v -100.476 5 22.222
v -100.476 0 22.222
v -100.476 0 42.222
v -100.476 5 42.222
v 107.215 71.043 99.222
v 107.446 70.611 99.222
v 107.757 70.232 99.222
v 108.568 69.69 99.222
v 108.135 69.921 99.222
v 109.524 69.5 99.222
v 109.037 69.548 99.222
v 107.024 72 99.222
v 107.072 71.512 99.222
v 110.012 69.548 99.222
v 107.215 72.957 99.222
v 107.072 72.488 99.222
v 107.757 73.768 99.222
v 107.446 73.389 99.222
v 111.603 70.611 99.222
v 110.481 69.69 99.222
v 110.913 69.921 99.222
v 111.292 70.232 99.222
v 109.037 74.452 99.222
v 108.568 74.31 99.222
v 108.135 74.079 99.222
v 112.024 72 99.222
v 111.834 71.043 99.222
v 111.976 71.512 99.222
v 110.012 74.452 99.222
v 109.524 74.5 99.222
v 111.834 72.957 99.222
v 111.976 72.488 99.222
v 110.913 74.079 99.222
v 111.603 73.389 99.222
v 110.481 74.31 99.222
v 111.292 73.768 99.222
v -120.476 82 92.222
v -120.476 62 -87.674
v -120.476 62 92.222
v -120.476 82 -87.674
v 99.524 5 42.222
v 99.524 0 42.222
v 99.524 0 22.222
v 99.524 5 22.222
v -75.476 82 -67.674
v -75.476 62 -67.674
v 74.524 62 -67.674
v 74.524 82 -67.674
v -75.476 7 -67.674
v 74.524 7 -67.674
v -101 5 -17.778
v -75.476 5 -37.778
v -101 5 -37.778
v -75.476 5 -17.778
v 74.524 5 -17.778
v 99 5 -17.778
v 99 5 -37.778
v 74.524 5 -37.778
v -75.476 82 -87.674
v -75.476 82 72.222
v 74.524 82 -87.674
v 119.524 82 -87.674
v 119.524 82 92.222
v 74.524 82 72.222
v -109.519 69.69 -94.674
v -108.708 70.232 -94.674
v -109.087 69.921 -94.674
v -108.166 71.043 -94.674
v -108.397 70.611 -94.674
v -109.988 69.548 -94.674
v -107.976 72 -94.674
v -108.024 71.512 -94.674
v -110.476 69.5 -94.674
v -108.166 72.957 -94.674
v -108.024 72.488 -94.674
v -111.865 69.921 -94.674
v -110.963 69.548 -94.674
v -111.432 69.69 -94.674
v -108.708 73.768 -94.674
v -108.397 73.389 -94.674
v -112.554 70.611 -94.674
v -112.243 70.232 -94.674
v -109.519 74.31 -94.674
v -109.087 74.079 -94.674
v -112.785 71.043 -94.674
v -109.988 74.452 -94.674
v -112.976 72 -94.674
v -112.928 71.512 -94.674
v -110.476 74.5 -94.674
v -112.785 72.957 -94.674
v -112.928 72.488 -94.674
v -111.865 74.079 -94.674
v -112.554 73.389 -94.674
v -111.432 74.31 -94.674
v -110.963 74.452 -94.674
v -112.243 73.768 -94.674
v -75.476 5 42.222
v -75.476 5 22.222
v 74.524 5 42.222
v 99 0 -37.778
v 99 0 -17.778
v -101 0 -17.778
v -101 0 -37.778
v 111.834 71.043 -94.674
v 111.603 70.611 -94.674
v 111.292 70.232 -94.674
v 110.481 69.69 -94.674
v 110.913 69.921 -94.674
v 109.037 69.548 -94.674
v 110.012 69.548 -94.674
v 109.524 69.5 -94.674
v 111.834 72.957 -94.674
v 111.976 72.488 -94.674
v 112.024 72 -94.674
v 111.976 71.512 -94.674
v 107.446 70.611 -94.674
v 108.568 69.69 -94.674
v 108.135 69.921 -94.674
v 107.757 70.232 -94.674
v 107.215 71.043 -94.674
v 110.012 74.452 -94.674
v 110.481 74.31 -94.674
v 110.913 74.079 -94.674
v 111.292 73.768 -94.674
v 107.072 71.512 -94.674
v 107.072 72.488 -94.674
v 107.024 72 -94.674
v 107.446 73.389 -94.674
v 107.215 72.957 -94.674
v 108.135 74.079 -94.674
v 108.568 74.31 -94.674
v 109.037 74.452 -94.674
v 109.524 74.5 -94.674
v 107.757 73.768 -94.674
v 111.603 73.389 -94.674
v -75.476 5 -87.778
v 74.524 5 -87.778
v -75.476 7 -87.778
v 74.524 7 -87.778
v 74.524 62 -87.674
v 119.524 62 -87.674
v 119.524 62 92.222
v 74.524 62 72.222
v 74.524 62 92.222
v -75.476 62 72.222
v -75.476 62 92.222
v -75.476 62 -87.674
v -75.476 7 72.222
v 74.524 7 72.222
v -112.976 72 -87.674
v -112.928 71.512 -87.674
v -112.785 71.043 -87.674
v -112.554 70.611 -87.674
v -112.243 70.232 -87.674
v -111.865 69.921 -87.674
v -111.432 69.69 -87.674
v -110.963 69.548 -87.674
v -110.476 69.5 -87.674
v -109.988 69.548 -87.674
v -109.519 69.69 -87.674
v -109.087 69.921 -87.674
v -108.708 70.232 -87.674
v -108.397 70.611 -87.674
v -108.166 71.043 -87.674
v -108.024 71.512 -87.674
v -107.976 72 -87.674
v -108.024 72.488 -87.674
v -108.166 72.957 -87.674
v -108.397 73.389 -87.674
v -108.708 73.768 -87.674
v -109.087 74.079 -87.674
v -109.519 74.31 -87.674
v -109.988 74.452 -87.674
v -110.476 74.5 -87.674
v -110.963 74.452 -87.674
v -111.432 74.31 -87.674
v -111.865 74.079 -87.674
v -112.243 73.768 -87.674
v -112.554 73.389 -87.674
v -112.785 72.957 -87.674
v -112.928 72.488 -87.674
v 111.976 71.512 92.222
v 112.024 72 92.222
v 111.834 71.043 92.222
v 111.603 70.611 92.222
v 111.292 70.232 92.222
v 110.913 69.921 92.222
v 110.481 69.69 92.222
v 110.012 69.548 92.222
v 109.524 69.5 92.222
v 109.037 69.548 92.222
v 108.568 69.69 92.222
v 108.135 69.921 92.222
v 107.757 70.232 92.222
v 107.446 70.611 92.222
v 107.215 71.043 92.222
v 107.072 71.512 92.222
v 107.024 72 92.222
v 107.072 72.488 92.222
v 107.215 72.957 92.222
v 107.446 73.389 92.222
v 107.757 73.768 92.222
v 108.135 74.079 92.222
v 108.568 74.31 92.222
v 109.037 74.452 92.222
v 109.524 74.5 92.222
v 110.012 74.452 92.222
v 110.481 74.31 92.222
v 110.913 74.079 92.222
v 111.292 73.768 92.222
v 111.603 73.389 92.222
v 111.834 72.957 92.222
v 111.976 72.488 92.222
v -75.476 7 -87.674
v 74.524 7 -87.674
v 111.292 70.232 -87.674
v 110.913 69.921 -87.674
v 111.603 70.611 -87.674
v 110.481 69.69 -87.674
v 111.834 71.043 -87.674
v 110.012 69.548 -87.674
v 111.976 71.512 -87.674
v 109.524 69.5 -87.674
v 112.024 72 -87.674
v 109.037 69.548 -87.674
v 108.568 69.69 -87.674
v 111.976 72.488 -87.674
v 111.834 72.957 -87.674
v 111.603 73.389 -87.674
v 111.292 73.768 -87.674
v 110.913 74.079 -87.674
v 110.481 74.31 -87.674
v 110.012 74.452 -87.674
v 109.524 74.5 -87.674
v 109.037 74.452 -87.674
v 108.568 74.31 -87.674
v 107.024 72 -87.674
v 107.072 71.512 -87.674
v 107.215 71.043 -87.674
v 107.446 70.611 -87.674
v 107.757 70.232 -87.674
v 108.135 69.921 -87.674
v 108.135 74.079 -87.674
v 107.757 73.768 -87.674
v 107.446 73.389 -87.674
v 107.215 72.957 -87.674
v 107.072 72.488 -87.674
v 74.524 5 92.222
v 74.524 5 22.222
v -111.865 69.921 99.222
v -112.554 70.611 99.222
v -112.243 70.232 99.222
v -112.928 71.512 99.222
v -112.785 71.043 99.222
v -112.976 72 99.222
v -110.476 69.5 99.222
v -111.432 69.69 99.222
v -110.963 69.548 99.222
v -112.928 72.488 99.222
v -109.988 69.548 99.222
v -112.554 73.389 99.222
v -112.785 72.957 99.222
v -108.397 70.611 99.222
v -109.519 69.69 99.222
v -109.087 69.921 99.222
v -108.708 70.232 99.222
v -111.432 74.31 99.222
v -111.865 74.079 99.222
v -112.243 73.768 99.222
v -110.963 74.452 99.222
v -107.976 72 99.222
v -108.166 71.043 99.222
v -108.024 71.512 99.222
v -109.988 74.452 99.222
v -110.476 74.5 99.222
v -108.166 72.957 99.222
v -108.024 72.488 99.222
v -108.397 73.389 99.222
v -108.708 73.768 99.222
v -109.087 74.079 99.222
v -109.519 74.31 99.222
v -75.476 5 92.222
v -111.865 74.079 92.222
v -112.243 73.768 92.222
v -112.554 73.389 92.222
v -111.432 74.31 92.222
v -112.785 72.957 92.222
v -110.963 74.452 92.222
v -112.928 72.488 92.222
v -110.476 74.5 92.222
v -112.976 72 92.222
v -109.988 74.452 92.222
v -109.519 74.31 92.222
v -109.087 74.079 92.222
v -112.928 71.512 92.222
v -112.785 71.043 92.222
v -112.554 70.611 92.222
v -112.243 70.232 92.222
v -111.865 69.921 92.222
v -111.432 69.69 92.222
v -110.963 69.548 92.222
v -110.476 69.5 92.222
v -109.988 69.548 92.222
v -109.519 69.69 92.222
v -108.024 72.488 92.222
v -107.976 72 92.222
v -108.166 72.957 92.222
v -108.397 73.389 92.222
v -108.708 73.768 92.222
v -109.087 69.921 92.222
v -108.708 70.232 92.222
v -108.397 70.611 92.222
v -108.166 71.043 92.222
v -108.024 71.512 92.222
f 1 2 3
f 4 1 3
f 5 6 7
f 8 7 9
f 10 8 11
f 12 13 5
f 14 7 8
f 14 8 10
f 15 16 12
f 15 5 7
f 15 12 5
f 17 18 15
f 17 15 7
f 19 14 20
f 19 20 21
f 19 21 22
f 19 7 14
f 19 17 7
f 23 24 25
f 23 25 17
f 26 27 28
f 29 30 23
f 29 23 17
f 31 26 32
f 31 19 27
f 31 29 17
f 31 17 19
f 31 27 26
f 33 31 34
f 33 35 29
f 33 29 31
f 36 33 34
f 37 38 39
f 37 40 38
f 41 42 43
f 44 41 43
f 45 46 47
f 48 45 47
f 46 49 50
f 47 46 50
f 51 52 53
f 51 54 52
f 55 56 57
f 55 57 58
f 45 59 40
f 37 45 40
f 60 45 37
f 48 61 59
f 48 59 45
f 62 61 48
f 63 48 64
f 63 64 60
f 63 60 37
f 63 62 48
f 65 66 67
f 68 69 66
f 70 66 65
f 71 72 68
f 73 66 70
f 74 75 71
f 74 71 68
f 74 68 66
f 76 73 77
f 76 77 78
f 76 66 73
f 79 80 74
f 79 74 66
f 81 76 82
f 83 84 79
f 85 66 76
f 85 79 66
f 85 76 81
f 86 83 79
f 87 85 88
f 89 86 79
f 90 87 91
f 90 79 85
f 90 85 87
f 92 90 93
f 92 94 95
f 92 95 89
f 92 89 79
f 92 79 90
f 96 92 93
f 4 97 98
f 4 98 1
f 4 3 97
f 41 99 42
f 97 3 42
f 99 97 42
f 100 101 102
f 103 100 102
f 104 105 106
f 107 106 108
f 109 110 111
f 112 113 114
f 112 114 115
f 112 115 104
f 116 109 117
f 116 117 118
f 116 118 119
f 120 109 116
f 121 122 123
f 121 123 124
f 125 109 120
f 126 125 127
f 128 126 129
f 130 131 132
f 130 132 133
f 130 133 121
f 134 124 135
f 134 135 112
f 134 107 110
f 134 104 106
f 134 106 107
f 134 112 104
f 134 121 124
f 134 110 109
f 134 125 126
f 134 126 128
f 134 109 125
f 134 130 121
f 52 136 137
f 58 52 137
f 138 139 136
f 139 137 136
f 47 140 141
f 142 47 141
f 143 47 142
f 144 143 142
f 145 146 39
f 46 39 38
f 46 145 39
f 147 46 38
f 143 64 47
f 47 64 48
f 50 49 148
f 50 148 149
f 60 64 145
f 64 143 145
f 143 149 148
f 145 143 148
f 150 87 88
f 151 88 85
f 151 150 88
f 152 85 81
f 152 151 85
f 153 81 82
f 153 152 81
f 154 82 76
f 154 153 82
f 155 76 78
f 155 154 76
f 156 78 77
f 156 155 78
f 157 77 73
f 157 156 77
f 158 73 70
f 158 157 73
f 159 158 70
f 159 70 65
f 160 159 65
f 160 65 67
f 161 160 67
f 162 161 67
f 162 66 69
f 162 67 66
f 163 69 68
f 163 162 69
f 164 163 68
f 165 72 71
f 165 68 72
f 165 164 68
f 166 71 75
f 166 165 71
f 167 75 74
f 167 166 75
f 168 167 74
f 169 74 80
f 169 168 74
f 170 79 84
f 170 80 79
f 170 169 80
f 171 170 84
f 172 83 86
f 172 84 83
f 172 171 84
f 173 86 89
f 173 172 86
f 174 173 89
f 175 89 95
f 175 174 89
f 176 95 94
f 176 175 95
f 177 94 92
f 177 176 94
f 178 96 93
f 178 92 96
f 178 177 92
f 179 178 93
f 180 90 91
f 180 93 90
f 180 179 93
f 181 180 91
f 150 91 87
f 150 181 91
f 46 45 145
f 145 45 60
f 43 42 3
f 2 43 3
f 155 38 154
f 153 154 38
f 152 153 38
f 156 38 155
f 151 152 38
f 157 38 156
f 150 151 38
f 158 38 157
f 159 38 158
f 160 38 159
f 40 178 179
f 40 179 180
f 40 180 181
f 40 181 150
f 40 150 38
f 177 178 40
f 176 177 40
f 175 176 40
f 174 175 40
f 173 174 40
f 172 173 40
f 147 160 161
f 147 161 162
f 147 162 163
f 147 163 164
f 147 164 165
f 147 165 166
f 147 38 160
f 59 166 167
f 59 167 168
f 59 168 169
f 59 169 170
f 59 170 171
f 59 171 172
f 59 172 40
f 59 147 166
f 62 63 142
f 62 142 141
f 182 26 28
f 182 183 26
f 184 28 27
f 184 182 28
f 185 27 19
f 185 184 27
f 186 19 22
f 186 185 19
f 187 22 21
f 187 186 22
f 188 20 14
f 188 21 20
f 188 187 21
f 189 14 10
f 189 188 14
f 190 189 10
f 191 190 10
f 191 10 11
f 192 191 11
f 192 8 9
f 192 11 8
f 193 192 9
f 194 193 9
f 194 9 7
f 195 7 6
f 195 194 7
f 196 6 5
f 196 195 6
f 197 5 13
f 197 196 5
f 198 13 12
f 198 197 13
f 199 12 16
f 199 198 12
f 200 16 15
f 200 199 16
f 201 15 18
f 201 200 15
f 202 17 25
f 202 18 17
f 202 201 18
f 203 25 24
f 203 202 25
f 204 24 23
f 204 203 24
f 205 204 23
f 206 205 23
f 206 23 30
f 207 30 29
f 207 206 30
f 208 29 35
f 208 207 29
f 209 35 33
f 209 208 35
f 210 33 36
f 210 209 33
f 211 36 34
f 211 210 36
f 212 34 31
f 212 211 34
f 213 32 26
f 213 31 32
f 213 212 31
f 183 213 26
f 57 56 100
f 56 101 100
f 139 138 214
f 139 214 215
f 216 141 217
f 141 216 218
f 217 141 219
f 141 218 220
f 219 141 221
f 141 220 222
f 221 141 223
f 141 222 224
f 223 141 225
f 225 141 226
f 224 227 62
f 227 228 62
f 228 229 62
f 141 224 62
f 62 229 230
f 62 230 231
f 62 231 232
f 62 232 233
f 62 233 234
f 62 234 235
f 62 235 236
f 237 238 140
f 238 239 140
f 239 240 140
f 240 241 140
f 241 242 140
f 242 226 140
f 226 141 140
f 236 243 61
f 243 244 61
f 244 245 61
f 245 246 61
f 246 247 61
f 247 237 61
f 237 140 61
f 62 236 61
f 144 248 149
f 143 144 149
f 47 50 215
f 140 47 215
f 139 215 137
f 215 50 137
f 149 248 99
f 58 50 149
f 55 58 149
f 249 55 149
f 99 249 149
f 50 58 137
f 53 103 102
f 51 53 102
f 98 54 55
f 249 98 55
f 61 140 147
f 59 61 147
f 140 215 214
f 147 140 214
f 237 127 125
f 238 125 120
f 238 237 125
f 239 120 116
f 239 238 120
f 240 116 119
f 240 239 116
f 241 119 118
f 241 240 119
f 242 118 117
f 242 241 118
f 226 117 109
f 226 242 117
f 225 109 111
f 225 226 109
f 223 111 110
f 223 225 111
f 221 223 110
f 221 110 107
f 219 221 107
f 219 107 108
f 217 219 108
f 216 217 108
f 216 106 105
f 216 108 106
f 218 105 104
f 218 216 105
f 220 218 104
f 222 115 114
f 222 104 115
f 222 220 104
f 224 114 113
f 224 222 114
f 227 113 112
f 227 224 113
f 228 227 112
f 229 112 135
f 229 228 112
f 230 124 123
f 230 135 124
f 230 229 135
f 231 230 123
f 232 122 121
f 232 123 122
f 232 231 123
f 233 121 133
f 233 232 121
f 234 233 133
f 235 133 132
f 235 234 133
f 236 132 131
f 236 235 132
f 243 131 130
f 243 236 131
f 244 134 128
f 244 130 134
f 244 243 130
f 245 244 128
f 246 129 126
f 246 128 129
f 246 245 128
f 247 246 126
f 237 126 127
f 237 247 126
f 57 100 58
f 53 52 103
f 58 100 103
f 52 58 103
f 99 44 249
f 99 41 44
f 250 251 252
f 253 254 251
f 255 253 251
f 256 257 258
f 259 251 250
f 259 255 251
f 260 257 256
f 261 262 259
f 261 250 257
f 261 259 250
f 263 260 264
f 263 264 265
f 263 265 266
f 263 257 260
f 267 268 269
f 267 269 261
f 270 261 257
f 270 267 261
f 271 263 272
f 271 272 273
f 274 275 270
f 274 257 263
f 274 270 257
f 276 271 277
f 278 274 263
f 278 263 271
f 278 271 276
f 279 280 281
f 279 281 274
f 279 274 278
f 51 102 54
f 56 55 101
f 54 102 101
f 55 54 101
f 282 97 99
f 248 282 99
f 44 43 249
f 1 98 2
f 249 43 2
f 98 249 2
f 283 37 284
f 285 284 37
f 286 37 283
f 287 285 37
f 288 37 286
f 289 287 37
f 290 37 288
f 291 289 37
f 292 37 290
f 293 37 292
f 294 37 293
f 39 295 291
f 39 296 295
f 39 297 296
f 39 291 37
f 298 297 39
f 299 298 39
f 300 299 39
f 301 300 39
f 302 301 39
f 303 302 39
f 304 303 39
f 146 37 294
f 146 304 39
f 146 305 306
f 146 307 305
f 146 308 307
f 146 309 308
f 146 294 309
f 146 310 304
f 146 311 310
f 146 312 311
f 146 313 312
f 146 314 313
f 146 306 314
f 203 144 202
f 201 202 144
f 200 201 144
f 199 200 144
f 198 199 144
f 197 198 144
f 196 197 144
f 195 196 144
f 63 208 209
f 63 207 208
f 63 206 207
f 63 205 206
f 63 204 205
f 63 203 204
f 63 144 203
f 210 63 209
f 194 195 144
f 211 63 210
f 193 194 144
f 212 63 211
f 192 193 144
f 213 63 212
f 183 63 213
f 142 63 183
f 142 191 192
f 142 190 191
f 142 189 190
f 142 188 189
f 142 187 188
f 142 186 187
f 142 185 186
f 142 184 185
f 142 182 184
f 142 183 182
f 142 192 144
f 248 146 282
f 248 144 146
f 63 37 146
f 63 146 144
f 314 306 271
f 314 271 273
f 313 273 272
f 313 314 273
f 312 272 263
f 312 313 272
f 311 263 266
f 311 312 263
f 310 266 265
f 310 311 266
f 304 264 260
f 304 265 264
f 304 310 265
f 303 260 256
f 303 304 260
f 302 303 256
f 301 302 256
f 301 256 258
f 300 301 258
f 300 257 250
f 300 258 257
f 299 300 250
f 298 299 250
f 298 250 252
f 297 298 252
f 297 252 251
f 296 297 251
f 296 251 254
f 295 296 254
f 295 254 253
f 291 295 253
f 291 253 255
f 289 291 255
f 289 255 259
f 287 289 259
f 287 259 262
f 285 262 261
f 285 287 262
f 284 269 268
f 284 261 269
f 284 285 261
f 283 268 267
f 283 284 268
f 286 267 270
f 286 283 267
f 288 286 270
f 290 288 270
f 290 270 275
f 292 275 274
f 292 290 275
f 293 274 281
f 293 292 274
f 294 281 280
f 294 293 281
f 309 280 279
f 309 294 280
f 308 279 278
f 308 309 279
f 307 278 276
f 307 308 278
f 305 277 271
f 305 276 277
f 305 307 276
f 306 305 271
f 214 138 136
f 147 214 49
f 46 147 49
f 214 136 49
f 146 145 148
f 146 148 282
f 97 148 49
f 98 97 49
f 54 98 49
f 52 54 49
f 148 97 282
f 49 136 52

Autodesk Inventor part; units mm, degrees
ref_plane "YZ Plane" through (0, 0, 0) normal (1, 0, 0) x (0, 1, 0)
ref_plane "XZ Plane" through (0, 0, 0) normal (0, 1, 0) x (-1, 0, 0)
ref_plane "XY Plane" through (0, 0, 0) normal (0, 0, 1) x (1, 0, 0)
sketch "Эскиз1" plane through (0, 0, 0) normal (0, 1, 0) x (-1, 0, 0)
  line L0 (100.4756, 42.2222) -> (-99.5244, 42.2222)
  line L1 (-99.5244, 42.2222) -> (-99.5244, 22.2222)
  line L2 (-99.5244, 22.2222) -> (100.4756, 22.2222)
  line L3 (100.4756, 22.2222) -> (100.4756, 42.2222)
  line L4 (101, -17.7778) -> (-99, -17.7778)
  line L5 (-99, -17.7778) -> (-99, -37.7778)
  line L6 (-99, -37.7778) -> (101, -37.7778)
  line L7 (101, -37.7778) -> (101, -17.7778)
  point P0 (0, 0)
  dimension "d0" = 200
  dimension "d1" = 20
  dimension "d2" = 200
  dimension "d3" = 20
  dimension "d4" = 40
extrude "Выдавливание1" add sketch "Эскиз1" along normal blind 5
sketch "Эскиз2" plane through (0, 5, 0) normal (0, 1, 0) x (1, 0, 0)
  line L0 (-75.4756, -92.2222) -> (74.5244, -92.2222)
  line L1 (74.5244, -92.2222) -> (74.5244, 87.7778)
  line L2 (74.5244, 87.7778) -> (-75.4756, 87.7778)
  line L3 (-75.4756, 87.7778) -> (-75.4756, -92.2222)
  line L4 (-100.4756, -42.2222) -> (99.5244, -42.2222) projected
  line L5 (99.5244, -42.2222) -> (99.5244, -22.2222) projected
  line L6 (-100.4756, -22.2222) -> (-100.4756, -42.2222) projected
  point P0 (0, 0)
  dimension "d7" = 180
  dimension "d8" = 50
  dimension "d11" = 150
  dimension "d12" = 25
extrude "Выдавливание2" add sketch "Эскиз2" along normal blind 2
sketch "Эскиз3" plane through (0, 7, 0) normal (0, 1, 0) x (1, 0, 0)
  line L0 (-75.4756, 87.7778) -> (-75.4756, -92.2222) projected
  line L1 (74.5244, -92.2222) -> (74.5244, 87.7778) projected
  line L2 (-75.4756, -92.2222) -> (74.5244, -92.2222)
  line L3 (74.5244, -92.2222) -> (74.5244, -72.2222)
  line L4 (74.5244, -72.2222) -> (-75.4756, -72.2222)
  line L5 (-75.4756, -72.2222) -> (-75.4756, -92.2222)
  line L6 (-75.4756, 67.6742) -> (74.5244, 67.6742)
  line L7 (74.5244, 67.6742) -> (74.5244, 87.6742)
  line L8 (74.5244, 87.6742) -> (-75.4756, 87.6742)
  line L9 (-75.4756, 87.6742) -> (-75.4756, 67.6742)
  point P0 (0, 0)
  point P1 (-75.4756, 87.6742)
  dimension "d14" = 20
  dimension "d15" = 20
extrude "Выдавливание3" add sketch "Эскиз3" along normal blind 75 contours L8 L1 L6 L0 | L4 L1 L2 L0
sketch "Эскиз4" plane through (74.5244, 5, 92.2222) normal (1, 0, 0) x (0, 0, -1)
  line L0 (0, 77) -> (20, 77) projected
  line L1 (179.8965, 2) -> (179.8965, 77) projected
  line L2 (0, 77) -> (179.8965, 77)
  line L3 (179.8965, 77) -> (179.8965, 57)
  line L4 (179.8965, 57) -> (0, 57)
  line L5 (0, 57) -> (0, 77)
  point P0 (92.2222, -5)
  dimension "d18" = 20
extrude "Выдавливание4" add sketch "Эскиз4" along normal blind 45
sketch "Эскиз5" plane through (-75.4756, 5, -87.7778) normal (-1, 0, 0) x (0, 0, 1)
  line L0 (0.1035, 57) -> (0.1035, 77) projected
  line L1 (180, 0) -> (180, 57) projected
  line L2 (0.1035, 77) -> (180, 77)
  line L3 (180, 77) -> (180, 57)
  line L4 (180, 57) -> (0.1035, 57)
  line L5 (0.1035, 57) -> (0.1035, 77)
  point P0 (87.7778, -5)
extrude "Выдавливание5" add sketch "Эскиз5" along normal blind 45
sketch "Эскиз6" plane through (74.5244, 7, -87.6742) normal (0, 0, -1) x (-1, 0, 0)
  circle A0 centre (185, 65) radius 2.5
  line L0 (195, 75) -> (195, 55) projected
  circle A1 centre (-35, 65) radius 2.5
  line L1 (-45, 55) -> (-45, 75) projected
  line L2 (195, 75) -> (-45, 75) projected
  point P0 (74.5244, -7)
  dimension "d23" = 10
  dimension "d24" = 5
  dimension "d25" = 5
  dimension "d26" = 10
  dimension "d27" = 10
  dimension "d28" = 10
extrude "Выдавливание6" add sketch "Эскиз6" along normal blind 3
sketch "Эскиз7" plane through (-75.4756, 5, 92.2222) normal (0, 0, 1) x (1, 0, 0)
  circle A0 centre (-35, 67) radius 2.5 projected
  circle A1 centre (-35, 67) radius 2.5
  circle A2 centre (185, 67) radius 2.5 projected
  circle A3 centre (185, 67) radius 2.5
  point P0 (75.4756, -5)
extrude "Выдавливание7" add sketch "Эскиз7" along normal blind 3
sketch "Эскиз9" plane through (109.5244, 72, -90.6742) normal (0, 0, -1) x (-1, 0, 0)
  circle A0 centre (0, 0) radius 2.5 projected
  circle A1 centre (0, 0) radius 2.5
  circle A2 centre (220, 0) radius 2.5 projected
  circle A3 centre (220, 0) radius 2.5
  point P0 (109.5244, -72)
extrude "Выдавливание8" add sketch "Эскиз9" along normal blind 4
sketch "Эскиз10" plane through (-75.4756, 5, 92.2222) normal (0, 0, 1) x (1, 0, 0)
  circle A0 centre (-35, 67) radius 2.5 projected
  circle A1 centre (-35, 67) radius 2.5
  circle A2 centre (185, 67) radius 2.5 projected
  circle A3 centre (185, 67) radius 2.5
  point P0 (75.4756, -5)
extrude "Выдавливание9" add sketch "Эскиз10" along normal blind 7
properties part number "часть транспортера" material "Железо, ковкое"
